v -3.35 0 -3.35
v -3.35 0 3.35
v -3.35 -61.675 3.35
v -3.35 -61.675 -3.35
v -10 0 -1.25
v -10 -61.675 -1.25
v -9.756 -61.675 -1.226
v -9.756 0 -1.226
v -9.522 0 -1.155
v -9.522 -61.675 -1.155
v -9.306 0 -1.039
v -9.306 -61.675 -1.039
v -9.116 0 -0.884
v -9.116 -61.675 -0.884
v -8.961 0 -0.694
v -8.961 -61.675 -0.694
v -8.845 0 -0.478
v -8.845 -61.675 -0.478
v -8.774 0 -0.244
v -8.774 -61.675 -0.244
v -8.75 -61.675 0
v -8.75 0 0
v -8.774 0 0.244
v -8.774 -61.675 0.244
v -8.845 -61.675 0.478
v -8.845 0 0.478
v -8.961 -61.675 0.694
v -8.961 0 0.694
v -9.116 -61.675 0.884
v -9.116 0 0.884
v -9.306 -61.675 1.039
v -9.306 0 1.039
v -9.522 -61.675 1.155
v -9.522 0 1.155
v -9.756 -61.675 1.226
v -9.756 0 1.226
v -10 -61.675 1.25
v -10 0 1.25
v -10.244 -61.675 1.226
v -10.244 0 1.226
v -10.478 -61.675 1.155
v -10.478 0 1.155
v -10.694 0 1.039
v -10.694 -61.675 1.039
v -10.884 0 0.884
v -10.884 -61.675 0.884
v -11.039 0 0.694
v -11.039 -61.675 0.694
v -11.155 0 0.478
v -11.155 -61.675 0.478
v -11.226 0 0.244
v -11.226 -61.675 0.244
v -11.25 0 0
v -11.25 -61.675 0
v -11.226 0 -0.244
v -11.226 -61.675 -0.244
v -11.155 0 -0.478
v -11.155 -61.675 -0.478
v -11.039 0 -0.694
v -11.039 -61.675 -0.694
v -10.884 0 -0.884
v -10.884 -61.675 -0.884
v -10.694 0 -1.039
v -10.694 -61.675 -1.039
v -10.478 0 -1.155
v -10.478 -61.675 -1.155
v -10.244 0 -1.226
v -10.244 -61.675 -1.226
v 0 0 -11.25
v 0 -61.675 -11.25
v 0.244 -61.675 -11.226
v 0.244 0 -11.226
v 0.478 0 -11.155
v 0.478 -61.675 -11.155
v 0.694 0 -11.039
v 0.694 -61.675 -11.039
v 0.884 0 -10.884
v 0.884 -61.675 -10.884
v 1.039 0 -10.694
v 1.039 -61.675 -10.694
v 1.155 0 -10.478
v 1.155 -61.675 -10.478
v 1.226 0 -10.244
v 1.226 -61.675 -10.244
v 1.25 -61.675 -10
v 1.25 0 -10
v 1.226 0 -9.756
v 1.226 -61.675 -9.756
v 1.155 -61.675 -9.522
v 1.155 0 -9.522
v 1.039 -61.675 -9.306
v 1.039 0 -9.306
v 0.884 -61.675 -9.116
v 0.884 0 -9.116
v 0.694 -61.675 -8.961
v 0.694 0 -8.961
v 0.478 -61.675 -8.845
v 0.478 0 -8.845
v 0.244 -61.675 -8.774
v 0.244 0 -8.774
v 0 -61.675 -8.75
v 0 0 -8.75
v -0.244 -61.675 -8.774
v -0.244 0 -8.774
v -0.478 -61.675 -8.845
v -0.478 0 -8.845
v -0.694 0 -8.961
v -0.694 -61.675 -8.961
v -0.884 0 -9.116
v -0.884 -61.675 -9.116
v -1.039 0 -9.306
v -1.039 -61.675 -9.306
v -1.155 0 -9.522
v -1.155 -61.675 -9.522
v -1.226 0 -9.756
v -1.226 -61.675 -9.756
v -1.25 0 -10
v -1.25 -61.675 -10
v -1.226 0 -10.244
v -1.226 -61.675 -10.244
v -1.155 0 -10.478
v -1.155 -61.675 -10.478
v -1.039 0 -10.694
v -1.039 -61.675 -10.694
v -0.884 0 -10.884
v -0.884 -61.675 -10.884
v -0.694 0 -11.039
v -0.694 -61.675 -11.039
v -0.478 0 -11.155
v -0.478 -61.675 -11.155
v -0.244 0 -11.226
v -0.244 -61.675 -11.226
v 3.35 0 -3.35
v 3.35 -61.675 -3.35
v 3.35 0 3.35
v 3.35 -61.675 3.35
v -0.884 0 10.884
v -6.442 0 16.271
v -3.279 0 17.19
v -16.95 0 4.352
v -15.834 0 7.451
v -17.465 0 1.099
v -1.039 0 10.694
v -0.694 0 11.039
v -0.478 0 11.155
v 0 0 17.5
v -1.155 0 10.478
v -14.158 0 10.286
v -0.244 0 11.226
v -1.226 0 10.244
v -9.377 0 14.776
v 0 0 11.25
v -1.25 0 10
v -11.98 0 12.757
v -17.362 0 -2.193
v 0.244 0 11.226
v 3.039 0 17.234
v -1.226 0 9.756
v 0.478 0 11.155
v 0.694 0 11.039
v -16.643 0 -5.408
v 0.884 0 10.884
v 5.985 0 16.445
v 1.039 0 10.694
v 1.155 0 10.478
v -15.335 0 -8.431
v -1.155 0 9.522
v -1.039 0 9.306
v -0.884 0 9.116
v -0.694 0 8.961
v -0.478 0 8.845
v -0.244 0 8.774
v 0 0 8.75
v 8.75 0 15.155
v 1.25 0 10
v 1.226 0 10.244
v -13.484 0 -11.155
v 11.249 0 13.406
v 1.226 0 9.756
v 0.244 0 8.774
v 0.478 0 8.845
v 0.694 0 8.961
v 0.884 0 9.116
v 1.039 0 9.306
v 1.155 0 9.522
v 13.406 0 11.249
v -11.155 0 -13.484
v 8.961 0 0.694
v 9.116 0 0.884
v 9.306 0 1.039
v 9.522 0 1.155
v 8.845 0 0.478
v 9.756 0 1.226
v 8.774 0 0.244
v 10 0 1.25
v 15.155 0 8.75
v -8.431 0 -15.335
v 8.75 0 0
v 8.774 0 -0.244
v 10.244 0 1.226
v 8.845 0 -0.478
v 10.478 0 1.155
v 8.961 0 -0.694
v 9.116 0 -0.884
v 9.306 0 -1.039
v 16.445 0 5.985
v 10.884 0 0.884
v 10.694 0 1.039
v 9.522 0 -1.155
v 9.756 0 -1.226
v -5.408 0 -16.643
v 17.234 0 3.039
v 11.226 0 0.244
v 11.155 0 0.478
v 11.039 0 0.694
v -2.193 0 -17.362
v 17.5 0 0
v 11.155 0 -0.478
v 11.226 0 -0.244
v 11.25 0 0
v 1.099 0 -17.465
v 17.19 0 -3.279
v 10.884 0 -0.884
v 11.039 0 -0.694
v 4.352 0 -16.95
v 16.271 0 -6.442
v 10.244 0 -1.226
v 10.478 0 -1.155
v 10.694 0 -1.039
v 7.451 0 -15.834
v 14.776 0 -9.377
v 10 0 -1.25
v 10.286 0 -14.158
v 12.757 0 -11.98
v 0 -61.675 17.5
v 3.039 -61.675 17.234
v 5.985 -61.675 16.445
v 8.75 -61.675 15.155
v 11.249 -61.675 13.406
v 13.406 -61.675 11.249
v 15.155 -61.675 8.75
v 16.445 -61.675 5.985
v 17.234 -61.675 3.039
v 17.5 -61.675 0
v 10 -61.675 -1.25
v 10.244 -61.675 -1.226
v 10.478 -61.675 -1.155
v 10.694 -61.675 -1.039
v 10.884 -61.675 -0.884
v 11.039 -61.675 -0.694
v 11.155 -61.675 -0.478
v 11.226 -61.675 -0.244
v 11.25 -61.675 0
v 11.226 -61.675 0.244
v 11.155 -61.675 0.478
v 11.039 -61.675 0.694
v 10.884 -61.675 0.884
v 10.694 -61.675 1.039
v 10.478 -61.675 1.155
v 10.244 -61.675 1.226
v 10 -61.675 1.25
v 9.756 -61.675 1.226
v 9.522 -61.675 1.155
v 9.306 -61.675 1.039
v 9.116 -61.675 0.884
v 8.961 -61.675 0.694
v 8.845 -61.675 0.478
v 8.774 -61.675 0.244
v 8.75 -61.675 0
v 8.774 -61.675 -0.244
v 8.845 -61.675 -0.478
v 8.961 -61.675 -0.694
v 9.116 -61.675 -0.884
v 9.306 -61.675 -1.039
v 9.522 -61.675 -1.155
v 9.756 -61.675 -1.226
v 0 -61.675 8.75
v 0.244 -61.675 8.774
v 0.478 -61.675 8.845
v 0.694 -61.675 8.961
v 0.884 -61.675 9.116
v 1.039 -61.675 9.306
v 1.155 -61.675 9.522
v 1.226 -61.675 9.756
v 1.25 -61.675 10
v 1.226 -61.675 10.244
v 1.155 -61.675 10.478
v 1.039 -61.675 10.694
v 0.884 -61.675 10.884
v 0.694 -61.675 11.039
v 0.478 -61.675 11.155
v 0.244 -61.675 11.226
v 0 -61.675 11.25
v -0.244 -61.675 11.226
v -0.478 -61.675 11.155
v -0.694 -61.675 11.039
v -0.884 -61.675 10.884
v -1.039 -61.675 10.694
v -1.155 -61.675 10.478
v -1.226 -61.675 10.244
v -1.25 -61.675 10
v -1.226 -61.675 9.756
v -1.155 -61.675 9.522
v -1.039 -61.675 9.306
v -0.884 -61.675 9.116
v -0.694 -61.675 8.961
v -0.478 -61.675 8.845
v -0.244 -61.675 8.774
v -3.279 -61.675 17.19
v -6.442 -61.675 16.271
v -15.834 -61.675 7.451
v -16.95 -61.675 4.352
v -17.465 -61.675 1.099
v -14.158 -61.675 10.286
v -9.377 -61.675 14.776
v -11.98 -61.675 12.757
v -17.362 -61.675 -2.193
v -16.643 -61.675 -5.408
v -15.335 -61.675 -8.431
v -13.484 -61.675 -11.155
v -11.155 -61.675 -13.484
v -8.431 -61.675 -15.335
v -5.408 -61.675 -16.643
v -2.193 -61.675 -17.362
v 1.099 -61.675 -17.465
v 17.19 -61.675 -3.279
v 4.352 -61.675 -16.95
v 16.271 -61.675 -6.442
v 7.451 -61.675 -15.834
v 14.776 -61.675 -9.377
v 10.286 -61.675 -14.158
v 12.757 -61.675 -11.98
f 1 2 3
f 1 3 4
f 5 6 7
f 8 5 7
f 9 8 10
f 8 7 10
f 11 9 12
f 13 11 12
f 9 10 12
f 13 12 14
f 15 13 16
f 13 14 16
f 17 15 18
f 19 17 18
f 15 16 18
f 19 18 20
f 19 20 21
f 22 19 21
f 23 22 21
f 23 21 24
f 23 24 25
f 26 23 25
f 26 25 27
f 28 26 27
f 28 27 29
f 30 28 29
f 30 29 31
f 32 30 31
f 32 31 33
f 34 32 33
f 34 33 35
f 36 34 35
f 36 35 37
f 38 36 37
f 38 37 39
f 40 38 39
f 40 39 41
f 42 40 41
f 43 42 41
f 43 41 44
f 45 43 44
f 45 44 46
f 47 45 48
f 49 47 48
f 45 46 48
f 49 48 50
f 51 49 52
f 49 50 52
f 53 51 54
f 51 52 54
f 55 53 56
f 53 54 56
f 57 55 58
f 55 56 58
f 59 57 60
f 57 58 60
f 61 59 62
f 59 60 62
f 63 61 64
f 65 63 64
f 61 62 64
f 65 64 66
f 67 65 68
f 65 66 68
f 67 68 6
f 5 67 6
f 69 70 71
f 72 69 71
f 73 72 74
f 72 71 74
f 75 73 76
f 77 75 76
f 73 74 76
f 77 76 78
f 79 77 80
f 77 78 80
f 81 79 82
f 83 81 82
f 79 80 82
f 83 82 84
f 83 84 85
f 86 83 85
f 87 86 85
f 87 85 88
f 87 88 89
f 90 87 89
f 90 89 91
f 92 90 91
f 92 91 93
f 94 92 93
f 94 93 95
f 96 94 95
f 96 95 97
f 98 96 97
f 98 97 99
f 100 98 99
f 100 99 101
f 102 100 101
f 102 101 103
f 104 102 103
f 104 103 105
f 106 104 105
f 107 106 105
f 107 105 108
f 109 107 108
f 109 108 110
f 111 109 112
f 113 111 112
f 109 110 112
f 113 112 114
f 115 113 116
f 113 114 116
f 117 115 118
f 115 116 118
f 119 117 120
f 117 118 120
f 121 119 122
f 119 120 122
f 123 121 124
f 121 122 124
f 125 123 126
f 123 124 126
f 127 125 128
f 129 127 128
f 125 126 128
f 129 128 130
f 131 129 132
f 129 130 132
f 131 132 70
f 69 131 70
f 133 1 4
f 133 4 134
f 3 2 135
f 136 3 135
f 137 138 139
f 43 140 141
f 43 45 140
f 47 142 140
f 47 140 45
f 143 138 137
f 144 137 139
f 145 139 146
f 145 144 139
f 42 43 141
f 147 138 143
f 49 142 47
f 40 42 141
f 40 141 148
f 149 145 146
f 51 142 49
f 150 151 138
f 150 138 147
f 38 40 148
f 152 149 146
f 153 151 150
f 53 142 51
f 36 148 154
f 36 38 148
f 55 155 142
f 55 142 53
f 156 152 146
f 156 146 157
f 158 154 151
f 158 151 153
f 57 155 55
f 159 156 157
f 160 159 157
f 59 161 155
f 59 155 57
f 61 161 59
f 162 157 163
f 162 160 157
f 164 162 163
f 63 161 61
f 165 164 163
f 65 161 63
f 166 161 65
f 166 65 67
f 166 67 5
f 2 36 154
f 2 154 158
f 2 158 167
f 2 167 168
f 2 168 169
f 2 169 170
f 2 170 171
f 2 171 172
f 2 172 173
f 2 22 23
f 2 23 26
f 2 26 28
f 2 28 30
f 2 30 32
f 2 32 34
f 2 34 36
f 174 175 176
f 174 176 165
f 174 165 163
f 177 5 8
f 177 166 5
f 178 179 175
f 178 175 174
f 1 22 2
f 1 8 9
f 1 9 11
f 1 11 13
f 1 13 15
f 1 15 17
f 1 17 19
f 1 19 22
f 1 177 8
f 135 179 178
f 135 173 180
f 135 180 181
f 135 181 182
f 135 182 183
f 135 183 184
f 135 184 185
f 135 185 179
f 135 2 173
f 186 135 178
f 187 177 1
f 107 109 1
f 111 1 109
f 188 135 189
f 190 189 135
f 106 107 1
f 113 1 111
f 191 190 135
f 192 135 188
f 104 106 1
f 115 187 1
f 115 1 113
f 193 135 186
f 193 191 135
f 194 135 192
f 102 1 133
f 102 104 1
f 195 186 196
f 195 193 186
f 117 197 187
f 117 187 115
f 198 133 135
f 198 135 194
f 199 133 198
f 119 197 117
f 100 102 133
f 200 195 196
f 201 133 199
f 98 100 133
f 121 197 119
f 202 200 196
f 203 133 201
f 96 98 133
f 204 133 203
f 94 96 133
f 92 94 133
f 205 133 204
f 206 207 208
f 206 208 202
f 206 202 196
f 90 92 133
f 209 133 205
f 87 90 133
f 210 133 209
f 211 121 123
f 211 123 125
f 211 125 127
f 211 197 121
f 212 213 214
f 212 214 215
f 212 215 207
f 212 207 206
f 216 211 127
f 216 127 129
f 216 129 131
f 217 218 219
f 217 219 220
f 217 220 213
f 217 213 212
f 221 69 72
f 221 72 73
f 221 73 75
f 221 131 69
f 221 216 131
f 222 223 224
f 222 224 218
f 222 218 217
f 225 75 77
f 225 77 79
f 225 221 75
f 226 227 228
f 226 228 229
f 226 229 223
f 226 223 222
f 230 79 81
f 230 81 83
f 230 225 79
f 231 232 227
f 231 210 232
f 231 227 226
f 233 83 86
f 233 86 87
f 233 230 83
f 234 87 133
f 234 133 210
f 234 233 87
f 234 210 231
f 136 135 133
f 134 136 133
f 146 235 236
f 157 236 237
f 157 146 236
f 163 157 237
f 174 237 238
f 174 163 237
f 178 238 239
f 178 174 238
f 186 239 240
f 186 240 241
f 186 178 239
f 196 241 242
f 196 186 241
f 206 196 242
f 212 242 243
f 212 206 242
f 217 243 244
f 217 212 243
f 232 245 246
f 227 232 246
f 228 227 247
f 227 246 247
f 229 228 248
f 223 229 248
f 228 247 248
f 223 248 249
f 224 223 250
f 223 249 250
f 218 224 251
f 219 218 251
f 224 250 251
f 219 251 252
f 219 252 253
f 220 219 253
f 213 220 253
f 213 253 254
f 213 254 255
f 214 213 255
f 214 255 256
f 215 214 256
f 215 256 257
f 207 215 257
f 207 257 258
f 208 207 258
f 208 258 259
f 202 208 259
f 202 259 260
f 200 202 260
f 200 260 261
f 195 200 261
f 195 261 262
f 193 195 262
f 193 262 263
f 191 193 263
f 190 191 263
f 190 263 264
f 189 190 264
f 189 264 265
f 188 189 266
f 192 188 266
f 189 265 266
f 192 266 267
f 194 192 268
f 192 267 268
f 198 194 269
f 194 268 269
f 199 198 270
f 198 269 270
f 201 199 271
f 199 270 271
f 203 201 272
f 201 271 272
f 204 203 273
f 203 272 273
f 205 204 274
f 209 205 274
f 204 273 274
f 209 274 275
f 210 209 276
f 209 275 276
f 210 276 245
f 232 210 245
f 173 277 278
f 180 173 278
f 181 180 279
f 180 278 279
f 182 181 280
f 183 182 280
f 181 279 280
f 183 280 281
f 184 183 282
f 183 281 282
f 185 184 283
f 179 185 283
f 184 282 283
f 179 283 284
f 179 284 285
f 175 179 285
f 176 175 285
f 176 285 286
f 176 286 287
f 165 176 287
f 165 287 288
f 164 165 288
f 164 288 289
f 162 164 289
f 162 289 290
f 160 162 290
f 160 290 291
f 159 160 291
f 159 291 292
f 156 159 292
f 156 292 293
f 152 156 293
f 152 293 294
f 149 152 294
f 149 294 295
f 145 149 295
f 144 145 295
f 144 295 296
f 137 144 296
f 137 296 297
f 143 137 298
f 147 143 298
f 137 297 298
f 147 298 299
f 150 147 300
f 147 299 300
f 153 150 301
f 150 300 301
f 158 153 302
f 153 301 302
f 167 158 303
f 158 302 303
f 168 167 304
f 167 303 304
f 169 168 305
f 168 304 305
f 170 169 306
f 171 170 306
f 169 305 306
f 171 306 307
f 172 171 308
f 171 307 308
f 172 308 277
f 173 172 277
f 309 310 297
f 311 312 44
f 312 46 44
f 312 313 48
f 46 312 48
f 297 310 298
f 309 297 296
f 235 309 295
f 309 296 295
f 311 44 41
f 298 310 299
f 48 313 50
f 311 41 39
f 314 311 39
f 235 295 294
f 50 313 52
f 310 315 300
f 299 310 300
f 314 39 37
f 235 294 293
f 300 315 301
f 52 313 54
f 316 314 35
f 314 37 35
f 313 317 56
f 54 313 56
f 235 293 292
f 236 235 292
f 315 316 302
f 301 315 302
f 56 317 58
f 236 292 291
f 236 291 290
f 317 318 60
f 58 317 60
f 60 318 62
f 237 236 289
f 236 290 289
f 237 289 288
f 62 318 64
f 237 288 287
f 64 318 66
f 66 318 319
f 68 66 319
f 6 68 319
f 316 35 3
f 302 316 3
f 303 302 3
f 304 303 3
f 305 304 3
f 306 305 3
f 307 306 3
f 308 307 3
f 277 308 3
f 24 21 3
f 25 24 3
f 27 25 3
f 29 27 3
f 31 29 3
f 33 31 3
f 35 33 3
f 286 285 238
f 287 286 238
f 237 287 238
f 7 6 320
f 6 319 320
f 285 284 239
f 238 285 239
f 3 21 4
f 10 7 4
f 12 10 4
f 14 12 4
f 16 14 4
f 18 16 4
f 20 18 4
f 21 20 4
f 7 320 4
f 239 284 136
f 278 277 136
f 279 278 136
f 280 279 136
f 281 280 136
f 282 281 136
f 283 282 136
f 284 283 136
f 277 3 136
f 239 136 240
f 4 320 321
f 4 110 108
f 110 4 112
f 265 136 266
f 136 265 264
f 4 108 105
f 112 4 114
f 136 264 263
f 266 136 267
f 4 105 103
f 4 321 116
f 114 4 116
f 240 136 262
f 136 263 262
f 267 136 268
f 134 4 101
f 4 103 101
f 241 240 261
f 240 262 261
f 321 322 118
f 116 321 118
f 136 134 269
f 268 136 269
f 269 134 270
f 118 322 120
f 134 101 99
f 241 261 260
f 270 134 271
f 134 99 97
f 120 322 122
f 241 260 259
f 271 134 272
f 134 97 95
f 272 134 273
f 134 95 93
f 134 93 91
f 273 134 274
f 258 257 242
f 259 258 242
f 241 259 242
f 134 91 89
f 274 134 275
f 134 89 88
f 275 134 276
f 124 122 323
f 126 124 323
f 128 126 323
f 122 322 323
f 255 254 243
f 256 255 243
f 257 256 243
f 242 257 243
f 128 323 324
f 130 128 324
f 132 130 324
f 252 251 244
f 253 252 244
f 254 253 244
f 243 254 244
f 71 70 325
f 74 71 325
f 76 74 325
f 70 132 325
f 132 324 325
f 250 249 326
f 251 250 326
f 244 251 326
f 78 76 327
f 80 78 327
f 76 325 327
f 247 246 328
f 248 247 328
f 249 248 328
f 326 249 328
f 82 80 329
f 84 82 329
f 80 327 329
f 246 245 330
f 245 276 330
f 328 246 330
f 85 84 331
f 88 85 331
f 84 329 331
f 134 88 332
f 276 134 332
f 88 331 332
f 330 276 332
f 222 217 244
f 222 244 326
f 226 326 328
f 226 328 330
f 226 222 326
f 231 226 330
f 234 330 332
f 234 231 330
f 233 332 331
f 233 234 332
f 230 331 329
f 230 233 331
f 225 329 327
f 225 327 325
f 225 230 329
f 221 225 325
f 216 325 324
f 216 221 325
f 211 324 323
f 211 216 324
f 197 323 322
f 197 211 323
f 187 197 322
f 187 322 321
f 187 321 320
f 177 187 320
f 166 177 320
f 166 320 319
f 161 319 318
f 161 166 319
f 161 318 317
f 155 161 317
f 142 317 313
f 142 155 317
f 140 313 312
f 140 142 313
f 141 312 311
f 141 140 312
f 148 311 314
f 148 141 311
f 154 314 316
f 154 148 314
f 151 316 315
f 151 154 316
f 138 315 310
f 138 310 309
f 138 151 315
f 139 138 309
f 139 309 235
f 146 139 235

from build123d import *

# Parameters (mm, degrees)
SKETCH1_W                   = 6.7
SKETCH1_H                   = 6.7
BOSS_EXTRUDE1_DEPTH         = 61.675
TAP_DRILL_FOR_M3X0_5_TAP1_D = 2.5


with BuildPart() as part:
    # Sketch1 → Boss-Extrude1 (new body)
    # profile 1 of 2: a face of its own
    with BuildSketch(Plane(origin=(0, 0, 0), x_dir=(1, 0, 0), z_dir=(0, 1, 0))):
        with BuildLine():
            ThreePointArc((0, -17.5), (12.374368671, -12.374368671), (17.5, 0))
            ThreePointArc((17.5, 0), (7.362522242, -7.362522242), (0, -17.5))
        make_face()
    # profile 2 of 2: a face of its own
    with BuildSketch(Plane(origin=(0, 0, 0), x_dir=(1, 0, 0), z_dir=(0, 1, 0))):
        with BuildLine():
            ThreePointArc((0, -17.5), (7.362522242, -7.362522242), (17.5, 0))
            ThreePointArc((17.5, 0), (-12.374368671, 12.374368671), (0, -17.5))
        make_face()
        Rectangle(SKETCH1_W, SKETCH1_H, mode=Mode.SUBTRACT)
    extrude(amount=-BOSS_EXTRUDE1_DEPTH)

    # Tap Drill for M3x0.5 Tap1 (through all)
    with Locations(Plane(origin=(0, 0, -10), x_dir=(0, 0, 1), z_dir=(0, 1, 0))):
        with Locations((0, 0), (10, 10), (10, -10), (20, 0)):
            Hole(TAP_DRILL_FOR_M3X0_5_TAP1_D / 2)


solid = part.part
